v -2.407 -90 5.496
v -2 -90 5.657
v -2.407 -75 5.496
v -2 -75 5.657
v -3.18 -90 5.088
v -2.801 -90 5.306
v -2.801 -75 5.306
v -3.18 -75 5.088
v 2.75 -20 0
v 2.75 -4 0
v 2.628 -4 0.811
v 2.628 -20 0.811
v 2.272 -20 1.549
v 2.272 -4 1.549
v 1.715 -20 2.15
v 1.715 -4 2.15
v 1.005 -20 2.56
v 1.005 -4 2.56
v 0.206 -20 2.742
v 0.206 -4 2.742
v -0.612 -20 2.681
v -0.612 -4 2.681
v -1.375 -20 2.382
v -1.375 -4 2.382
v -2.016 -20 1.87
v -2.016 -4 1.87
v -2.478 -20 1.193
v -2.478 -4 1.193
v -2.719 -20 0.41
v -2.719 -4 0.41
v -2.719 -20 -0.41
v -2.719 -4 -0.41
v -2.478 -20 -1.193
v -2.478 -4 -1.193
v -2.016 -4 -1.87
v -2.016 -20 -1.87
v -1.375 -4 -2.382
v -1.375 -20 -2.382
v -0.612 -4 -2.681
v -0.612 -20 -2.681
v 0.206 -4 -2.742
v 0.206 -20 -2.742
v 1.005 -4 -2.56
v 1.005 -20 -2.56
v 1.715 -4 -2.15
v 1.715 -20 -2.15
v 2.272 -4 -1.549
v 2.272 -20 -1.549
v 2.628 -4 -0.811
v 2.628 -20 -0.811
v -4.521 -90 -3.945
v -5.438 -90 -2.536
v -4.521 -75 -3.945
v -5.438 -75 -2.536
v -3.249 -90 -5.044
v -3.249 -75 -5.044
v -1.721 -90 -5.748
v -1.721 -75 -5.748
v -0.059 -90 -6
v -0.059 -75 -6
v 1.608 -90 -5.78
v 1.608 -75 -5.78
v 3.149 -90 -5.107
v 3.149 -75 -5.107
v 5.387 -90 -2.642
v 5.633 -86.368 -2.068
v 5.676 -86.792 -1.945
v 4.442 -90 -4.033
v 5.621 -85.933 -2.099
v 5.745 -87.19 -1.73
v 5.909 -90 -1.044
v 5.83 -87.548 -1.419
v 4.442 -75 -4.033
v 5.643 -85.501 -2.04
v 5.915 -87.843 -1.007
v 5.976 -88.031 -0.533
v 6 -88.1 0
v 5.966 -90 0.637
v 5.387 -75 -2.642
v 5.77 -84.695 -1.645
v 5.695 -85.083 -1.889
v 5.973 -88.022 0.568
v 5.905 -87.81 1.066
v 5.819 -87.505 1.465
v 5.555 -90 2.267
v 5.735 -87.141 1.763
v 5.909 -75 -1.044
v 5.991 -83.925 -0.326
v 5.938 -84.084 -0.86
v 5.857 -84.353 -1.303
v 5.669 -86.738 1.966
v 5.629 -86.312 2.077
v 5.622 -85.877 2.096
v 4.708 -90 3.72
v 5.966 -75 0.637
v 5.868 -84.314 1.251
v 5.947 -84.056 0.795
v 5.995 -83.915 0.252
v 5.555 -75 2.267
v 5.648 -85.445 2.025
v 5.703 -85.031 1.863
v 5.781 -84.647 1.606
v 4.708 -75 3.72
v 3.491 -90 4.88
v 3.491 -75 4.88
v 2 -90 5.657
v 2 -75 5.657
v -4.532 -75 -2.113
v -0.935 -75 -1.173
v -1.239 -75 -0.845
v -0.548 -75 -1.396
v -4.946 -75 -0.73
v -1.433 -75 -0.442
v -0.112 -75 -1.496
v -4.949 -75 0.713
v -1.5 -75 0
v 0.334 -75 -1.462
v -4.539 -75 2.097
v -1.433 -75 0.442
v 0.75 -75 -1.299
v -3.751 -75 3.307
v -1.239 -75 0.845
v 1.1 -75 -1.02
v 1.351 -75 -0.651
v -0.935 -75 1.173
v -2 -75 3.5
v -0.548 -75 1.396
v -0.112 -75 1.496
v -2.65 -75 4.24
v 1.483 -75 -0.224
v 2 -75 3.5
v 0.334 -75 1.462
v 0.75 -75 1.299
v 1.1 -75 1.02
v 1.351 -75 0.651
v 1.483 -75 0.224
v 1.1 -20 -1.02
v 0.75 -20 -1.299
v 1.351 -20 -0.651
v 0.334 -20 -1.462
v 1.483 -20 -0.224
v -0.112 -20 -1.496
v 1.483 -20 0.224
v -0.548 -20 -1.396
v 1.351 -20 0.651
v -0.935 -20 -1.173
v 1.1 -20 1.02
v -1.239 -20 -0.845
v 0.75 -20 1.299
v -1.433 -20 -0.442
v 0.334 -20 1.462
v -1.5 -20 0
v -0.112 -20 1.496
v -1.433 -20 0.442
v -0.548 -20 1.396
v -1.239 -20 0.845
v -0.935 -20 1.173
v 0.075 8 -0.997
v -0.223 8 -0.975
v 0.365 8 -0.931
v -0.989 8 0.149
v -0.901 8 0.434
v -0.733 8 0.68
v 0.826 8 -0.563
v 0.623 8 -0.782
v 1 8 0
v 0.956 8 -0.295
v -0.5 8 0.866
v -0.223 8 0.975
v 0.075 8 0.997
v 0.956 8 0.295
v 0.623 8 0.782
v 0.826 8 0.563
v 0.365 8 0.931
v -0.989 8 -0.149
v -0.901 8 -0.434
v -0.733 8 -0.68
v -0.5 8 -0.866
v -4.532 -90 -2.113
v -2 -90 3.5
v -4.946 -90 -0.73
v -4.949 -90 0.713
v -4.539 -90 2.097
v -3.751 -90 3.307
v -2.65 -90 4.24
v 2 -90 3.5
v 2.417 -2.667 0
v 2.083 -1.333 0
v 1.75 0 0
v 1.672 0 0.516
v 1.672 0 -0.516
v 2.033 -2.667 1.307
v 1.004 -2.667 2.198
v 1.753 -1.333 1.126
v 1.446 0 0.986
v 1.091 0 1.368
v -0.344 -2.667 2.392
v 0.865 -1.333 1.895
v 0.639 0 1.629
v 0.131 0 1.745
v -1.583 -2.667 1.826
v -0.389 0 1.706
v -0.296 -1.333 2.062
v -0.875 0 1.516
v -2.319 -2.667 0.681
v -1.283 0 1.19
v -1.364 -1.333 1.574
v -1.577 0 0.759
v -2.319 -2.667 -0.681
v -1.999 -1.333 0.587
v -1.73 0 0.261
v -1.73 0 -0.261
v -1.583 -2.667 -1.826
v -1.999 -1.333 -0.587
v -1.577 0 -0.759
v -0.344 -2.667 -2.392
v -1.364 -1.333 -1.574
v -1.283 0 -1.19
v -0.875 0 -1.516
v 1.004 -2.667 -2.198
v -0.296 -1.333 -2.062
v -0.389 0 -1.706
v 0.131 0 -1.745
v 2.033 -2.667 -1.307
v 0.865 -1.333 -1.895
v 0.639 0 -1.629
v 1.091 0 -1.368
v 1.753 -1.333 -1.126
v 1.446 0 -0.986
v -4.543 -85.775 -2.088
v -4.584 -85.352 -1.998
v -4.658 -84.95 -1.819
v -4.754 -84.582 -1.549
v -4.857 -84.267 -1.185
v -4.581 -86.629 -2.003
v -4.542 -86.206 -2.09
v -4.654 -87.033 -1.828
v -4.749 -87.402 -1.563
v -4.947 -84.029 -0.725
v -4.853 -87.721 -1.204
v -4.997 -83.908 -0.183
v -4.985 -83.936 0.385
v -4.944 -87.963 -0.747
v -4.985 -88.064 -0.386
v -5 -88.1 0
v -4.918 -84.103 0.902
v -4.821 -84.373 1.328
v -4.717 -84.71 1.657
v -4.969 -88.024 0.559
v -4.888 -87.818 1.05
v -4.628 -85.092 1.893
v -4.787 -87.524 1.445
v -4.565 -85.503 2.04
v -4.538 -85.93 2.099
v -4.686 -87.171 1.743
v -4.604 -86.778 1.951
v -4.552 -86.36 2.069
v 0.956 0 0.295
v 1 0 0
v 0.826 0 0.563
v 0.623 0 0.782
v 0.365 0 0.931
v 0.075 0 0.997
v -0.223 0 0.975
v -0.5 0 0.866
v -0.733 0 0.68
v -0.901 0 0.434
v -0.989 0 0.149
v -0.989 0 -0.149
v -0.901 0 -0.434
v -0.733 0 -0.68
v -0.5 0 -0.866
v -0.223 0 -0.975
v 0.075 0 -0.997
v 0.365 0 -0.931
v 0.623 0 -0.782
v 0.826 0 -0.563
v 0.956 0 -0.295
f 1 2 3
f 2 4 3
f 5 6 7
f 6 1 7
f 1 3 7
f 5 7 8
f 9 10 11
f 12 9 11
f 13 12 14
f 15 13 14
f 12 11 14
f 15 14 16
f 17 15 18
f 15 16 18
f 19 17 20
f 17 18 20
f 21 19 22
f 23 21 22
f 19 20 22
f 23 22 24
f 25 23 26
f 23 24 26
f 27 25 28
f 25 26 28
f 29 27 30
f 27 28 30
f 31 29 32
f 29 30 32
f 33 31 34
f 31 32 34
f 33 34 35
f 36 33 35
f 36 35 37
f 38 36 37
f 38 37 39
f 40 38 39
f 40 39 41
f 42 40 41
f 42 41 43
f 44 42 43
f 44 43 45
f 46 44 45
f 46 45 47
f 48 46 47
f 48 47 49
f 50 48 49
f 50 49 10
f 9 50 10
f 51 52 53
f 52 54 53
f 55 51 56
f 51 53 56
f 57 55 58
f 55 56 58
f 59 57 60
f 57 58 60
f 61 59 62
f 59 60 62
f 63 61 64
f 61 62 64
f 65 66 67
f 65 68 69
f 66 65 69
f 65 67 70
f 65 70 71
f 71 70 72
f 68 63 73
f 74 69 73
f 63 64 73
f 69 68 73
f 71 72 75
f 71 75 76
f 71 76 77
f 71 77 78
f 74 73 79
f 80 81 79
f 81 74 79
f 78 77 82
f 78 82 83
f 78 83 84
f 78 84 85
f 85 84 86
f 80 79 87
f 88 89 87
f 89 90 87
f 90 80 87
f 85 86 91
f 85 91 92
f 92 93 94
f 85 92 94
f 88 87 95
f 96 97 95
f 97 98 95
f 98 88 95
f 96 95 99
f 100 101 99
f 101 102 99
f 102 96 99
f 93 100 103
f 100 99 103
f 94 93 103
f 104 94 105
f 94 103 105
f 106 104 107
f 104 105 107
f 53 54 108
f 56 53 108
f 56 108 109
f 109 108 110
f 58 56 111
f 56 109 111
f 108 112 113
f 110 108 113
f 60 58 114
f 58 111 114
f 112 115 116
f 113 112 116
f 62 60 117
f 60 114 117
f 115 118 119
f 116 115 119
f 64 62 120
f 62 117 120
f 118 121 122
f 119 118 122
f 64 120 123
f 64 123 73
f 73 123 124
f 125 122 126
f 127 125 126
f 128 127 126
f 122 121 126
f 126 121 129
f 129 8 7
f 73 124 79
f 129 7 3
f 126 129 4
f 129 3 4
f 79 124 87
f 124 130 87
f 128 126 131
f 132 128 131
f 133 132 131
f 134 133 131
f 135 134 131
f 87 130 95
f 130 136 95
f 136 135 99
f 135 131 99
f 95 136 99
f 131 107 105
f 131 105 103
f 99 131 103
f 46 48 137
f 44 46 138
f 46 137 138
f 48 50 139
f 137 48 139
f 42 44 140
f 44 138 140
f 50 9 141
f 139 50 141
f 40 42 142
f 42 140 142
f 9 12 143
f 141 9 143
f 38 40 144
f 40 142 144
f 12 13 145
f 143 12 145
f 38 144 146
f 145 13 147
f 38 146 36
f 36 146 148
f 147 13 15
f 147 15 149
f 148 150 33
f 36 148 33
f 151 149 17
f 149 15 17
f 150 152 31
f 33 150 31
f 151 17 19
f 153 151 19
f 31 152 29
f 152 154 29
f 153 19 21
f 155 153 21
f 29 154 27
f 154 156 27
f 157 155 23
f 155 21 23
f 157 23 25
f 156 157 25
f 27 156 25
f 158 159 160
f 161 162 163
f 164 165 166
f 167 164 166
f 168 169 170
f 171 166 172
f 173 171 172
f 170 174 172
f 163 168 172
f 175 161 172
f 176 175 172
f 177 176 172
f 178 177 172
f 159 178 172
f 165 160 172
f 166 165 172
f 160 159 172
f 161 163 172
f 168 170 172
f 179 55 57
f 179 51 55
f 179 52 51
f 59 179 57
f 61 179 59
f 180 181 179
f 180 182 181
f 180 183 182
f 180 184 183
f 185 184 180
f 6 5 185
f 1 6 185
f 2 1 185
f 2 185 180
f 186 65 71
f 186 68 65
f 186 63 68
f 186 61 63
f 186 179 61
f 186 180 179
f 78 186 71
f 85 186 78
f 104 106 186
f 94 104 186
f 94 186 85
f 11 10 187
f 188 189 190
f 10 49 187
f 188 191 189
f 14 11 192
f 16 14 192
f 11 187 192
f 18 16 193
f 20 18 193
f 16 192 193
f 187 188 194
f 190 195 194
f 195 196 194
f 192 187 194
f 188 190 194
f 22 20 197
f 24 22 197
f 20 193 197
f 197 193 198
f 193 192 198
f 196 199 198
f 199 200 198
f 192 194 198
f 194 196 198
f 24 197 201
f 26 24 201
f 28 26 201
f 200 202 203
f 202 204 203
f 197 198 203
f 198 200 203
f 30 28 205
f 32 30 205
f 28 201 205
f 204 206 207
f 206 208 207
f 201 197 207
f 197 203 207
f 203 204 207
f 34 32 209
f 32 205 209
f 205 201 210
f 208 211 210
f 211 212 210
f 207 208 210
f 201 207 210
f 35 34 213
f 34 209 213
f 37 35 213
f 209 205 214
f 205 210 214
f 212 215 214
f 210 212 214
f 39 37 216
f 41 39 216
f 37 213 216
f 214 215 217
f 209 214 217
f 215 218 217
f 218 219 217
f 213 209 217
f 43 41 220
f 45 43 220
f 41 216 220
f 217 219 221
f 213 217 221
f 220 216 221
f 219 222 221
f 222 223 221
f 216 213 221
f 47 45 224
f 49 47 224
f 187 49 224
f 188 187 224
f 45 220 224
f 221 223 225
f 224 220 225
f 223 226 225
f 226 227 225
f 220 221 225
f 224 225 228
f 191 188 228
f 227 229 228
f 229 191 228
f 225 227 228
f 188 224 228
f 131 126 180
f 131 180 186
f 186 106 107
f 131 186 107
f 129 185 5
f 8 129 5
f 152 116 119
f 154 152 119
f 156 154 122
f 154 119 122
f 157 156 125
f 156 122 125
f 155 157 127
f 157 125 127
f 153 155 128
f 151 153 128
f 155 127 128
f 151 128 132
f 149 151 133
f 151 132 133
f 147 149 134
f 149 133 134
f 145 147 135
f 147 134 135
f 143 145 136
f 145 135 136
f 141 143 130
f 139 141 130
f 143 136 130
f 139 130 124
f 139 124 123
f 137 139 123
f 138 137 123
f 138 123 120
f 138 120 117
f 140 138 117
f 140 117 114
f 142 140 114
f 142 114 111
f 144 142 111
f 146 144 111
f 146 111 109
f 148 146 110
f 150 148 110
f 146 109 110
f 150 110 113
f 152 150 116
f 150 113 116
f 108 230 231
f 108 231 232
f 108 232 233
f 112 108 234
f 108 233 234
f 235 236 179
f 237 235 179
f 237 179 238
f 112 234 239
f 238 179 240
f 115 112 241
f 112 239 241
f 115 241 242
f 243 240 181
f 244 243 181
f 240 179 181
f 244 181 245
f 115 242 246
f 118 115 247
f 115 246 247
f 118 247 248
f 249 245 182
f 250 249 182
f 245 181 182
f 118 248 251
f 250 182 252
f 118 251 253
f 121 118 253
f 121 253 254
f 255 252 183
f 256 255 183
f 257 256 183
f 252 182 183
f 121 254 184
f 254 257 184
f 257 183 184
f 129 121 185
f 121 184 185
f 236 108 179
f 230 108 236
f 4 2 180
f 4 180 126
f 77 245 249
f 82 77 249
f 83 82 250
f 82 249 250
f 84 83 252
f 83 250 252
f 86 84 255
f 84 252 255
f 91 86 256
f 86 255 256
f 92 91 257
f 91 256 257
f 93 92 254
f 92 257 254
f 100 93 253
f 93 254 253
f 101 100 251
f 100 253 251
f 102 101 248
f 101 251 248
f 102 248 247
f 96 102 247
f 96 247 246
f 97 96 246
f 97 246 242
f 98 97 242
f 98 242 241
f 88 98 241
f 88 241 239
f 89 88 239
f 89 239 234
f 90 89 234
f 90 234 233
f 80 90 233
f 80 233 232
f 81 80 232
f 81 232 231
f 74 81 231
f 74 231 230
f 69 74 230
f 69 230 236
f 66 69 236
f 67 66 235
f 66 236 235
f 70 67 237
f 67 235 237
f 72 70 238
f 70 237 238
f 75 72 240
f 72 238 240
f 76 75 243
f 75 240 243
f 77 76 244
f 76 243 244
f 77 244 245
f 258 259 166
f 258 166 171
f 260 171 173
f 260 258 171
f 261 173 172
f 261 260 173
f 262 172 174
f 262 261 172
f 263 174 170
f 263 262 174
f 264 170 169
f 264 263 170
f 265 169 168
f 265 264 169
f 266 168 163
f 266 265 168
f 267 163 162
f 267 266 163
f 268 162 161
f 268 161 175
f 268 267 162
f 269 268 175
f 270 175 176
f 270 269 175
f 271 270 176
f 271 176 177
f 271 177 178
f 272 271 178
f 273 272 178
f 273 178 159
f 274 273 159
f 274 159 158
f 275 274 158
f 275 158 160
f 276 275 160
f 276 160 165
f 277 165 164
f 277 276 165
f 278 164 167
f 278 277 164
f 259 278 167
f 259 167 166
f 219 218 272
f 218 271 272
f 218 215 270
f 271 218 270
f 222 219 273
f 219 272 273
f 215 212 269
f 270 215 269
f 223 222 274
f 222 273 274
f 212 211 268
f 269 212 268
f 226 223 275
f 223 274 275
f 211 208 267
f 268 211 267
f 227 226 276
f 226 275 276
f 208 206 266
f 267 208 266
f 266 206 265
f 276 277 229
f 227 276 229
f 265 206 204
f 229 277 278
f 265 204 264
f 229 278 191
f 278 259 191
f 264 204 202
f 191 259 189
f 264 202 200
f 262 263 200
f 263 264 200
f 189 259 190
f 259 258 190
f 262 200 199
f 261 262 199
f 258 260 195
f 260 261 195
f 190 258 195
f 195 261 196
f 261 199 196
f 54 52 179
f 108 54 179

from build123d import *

# Parameters (mm, degrees)
F0_R      = 1
F1_DEPTH  = 8
F2_R      = 2.75
F3_DEPTH  = 80
F4_SIZE2  = 1
F4_SIZE   = 4
F5_R      = 6
F5_R_2    = 2.75
F6_DEPTH  = 5
F7_DEPTH  = 10
F12_R     = 2.75
F12_R_2   = 1.5
F13_DEPTH = 55
F15_D     = 4.2
F16_W     = 4
F16_H     = 15
F17_DEPTH = 2.5
F24_DEPTH = 15


with BuildPart() as f1:
    # F0 (on Front) → F1 (new body)
    with BuildSketch(Plane.XZ):
        Circle(F0_R)
    extrude(amount=-F1_DEPTH)

    # F2 (on face) → F3 (join)
    with BuildSketch(Plane.XZ):
        Circle(F2_R)
    extrude(amount=F3_DEPTH)

    # F4
    f4_edges = [f1.edges().sort_by_distance(p)[0] for p in [
        (-2.75, 0, 0),
    ]]
    f4_side = f1.faces().sort_by_distance((-2.75, -40, 0))[0]
    chamfer(f4_edges, length=F4_SIZE, length2=F4_SIZE2, reference=f4_side)

    # F5 (on face) → F6 (join)
    with BuildSketch(Plane.XZ.offset(80)):
        Circle(F5_R)
        Circle(F5_R_2, mode=Mode.SUBTRACT)
    extrude(amount=-F6_DEPTH)

    # F7 (add): a face of the model
    f7_faces = [f1.faces().sort_by_distance(p)[0] for p in [
        (0, -80, 0),
    ]]
    extrude(f7_faces, amount=F7_DEPTH)

    # F12 (on face) → F13 (cut)
    with BuildSketch(Plane(origin=(0, -75, 0), x_dir=(-1, 0, 0), z_dir=(0, 1, 0))):
        Circle(F12_R)
        Circle(F12_R_2, mode=Mode.SUBTRACT)
    extrude(amount=F13_DEPTH, mode=Mode.SUBTRACT)

    # F15 (through all)
    with Locations(Plane.YZ.offset(6)):
        with Locations((-86, 0)):
            Hole(F15_D / 2)

    # F16 (on offset) → F17 (cut)
    with BuildSketch(Plane.XY.offset(6)):
        with Locations((0, -82.5)):
            Rectangle(F16_W, F16_H)
    extrude(amount=-F17_DEPTH, mode=Mode.SUBTRACT)

    # F23 (on face) → F24 (cut)
    with BuildSketch(Plane.XZ.offset(90)):
        with BuildLine():
            ThreePointArc((-3.1795155854, 5.0882885769), (-5.7529184092, 1.7040920682), (-5.4378467222, -2.5357095704))
            Line((-5.4378467222, -2.5357095704), (-4.5315389352, -2.1130913087))
            ThreePointArc((-4.5315389352, -2.1130913087), (-4.7940986743, 1.4200767235), (-2.6495963212, 4.2402404808))
            Line((-2.6495963212, 4.2402404808), (-3.1795155854, 5.0882885769))
        make_face()
    extrude(amount=-F24_DEPTH, mode=Mode.SUBTRACT)


solid = f1.part
